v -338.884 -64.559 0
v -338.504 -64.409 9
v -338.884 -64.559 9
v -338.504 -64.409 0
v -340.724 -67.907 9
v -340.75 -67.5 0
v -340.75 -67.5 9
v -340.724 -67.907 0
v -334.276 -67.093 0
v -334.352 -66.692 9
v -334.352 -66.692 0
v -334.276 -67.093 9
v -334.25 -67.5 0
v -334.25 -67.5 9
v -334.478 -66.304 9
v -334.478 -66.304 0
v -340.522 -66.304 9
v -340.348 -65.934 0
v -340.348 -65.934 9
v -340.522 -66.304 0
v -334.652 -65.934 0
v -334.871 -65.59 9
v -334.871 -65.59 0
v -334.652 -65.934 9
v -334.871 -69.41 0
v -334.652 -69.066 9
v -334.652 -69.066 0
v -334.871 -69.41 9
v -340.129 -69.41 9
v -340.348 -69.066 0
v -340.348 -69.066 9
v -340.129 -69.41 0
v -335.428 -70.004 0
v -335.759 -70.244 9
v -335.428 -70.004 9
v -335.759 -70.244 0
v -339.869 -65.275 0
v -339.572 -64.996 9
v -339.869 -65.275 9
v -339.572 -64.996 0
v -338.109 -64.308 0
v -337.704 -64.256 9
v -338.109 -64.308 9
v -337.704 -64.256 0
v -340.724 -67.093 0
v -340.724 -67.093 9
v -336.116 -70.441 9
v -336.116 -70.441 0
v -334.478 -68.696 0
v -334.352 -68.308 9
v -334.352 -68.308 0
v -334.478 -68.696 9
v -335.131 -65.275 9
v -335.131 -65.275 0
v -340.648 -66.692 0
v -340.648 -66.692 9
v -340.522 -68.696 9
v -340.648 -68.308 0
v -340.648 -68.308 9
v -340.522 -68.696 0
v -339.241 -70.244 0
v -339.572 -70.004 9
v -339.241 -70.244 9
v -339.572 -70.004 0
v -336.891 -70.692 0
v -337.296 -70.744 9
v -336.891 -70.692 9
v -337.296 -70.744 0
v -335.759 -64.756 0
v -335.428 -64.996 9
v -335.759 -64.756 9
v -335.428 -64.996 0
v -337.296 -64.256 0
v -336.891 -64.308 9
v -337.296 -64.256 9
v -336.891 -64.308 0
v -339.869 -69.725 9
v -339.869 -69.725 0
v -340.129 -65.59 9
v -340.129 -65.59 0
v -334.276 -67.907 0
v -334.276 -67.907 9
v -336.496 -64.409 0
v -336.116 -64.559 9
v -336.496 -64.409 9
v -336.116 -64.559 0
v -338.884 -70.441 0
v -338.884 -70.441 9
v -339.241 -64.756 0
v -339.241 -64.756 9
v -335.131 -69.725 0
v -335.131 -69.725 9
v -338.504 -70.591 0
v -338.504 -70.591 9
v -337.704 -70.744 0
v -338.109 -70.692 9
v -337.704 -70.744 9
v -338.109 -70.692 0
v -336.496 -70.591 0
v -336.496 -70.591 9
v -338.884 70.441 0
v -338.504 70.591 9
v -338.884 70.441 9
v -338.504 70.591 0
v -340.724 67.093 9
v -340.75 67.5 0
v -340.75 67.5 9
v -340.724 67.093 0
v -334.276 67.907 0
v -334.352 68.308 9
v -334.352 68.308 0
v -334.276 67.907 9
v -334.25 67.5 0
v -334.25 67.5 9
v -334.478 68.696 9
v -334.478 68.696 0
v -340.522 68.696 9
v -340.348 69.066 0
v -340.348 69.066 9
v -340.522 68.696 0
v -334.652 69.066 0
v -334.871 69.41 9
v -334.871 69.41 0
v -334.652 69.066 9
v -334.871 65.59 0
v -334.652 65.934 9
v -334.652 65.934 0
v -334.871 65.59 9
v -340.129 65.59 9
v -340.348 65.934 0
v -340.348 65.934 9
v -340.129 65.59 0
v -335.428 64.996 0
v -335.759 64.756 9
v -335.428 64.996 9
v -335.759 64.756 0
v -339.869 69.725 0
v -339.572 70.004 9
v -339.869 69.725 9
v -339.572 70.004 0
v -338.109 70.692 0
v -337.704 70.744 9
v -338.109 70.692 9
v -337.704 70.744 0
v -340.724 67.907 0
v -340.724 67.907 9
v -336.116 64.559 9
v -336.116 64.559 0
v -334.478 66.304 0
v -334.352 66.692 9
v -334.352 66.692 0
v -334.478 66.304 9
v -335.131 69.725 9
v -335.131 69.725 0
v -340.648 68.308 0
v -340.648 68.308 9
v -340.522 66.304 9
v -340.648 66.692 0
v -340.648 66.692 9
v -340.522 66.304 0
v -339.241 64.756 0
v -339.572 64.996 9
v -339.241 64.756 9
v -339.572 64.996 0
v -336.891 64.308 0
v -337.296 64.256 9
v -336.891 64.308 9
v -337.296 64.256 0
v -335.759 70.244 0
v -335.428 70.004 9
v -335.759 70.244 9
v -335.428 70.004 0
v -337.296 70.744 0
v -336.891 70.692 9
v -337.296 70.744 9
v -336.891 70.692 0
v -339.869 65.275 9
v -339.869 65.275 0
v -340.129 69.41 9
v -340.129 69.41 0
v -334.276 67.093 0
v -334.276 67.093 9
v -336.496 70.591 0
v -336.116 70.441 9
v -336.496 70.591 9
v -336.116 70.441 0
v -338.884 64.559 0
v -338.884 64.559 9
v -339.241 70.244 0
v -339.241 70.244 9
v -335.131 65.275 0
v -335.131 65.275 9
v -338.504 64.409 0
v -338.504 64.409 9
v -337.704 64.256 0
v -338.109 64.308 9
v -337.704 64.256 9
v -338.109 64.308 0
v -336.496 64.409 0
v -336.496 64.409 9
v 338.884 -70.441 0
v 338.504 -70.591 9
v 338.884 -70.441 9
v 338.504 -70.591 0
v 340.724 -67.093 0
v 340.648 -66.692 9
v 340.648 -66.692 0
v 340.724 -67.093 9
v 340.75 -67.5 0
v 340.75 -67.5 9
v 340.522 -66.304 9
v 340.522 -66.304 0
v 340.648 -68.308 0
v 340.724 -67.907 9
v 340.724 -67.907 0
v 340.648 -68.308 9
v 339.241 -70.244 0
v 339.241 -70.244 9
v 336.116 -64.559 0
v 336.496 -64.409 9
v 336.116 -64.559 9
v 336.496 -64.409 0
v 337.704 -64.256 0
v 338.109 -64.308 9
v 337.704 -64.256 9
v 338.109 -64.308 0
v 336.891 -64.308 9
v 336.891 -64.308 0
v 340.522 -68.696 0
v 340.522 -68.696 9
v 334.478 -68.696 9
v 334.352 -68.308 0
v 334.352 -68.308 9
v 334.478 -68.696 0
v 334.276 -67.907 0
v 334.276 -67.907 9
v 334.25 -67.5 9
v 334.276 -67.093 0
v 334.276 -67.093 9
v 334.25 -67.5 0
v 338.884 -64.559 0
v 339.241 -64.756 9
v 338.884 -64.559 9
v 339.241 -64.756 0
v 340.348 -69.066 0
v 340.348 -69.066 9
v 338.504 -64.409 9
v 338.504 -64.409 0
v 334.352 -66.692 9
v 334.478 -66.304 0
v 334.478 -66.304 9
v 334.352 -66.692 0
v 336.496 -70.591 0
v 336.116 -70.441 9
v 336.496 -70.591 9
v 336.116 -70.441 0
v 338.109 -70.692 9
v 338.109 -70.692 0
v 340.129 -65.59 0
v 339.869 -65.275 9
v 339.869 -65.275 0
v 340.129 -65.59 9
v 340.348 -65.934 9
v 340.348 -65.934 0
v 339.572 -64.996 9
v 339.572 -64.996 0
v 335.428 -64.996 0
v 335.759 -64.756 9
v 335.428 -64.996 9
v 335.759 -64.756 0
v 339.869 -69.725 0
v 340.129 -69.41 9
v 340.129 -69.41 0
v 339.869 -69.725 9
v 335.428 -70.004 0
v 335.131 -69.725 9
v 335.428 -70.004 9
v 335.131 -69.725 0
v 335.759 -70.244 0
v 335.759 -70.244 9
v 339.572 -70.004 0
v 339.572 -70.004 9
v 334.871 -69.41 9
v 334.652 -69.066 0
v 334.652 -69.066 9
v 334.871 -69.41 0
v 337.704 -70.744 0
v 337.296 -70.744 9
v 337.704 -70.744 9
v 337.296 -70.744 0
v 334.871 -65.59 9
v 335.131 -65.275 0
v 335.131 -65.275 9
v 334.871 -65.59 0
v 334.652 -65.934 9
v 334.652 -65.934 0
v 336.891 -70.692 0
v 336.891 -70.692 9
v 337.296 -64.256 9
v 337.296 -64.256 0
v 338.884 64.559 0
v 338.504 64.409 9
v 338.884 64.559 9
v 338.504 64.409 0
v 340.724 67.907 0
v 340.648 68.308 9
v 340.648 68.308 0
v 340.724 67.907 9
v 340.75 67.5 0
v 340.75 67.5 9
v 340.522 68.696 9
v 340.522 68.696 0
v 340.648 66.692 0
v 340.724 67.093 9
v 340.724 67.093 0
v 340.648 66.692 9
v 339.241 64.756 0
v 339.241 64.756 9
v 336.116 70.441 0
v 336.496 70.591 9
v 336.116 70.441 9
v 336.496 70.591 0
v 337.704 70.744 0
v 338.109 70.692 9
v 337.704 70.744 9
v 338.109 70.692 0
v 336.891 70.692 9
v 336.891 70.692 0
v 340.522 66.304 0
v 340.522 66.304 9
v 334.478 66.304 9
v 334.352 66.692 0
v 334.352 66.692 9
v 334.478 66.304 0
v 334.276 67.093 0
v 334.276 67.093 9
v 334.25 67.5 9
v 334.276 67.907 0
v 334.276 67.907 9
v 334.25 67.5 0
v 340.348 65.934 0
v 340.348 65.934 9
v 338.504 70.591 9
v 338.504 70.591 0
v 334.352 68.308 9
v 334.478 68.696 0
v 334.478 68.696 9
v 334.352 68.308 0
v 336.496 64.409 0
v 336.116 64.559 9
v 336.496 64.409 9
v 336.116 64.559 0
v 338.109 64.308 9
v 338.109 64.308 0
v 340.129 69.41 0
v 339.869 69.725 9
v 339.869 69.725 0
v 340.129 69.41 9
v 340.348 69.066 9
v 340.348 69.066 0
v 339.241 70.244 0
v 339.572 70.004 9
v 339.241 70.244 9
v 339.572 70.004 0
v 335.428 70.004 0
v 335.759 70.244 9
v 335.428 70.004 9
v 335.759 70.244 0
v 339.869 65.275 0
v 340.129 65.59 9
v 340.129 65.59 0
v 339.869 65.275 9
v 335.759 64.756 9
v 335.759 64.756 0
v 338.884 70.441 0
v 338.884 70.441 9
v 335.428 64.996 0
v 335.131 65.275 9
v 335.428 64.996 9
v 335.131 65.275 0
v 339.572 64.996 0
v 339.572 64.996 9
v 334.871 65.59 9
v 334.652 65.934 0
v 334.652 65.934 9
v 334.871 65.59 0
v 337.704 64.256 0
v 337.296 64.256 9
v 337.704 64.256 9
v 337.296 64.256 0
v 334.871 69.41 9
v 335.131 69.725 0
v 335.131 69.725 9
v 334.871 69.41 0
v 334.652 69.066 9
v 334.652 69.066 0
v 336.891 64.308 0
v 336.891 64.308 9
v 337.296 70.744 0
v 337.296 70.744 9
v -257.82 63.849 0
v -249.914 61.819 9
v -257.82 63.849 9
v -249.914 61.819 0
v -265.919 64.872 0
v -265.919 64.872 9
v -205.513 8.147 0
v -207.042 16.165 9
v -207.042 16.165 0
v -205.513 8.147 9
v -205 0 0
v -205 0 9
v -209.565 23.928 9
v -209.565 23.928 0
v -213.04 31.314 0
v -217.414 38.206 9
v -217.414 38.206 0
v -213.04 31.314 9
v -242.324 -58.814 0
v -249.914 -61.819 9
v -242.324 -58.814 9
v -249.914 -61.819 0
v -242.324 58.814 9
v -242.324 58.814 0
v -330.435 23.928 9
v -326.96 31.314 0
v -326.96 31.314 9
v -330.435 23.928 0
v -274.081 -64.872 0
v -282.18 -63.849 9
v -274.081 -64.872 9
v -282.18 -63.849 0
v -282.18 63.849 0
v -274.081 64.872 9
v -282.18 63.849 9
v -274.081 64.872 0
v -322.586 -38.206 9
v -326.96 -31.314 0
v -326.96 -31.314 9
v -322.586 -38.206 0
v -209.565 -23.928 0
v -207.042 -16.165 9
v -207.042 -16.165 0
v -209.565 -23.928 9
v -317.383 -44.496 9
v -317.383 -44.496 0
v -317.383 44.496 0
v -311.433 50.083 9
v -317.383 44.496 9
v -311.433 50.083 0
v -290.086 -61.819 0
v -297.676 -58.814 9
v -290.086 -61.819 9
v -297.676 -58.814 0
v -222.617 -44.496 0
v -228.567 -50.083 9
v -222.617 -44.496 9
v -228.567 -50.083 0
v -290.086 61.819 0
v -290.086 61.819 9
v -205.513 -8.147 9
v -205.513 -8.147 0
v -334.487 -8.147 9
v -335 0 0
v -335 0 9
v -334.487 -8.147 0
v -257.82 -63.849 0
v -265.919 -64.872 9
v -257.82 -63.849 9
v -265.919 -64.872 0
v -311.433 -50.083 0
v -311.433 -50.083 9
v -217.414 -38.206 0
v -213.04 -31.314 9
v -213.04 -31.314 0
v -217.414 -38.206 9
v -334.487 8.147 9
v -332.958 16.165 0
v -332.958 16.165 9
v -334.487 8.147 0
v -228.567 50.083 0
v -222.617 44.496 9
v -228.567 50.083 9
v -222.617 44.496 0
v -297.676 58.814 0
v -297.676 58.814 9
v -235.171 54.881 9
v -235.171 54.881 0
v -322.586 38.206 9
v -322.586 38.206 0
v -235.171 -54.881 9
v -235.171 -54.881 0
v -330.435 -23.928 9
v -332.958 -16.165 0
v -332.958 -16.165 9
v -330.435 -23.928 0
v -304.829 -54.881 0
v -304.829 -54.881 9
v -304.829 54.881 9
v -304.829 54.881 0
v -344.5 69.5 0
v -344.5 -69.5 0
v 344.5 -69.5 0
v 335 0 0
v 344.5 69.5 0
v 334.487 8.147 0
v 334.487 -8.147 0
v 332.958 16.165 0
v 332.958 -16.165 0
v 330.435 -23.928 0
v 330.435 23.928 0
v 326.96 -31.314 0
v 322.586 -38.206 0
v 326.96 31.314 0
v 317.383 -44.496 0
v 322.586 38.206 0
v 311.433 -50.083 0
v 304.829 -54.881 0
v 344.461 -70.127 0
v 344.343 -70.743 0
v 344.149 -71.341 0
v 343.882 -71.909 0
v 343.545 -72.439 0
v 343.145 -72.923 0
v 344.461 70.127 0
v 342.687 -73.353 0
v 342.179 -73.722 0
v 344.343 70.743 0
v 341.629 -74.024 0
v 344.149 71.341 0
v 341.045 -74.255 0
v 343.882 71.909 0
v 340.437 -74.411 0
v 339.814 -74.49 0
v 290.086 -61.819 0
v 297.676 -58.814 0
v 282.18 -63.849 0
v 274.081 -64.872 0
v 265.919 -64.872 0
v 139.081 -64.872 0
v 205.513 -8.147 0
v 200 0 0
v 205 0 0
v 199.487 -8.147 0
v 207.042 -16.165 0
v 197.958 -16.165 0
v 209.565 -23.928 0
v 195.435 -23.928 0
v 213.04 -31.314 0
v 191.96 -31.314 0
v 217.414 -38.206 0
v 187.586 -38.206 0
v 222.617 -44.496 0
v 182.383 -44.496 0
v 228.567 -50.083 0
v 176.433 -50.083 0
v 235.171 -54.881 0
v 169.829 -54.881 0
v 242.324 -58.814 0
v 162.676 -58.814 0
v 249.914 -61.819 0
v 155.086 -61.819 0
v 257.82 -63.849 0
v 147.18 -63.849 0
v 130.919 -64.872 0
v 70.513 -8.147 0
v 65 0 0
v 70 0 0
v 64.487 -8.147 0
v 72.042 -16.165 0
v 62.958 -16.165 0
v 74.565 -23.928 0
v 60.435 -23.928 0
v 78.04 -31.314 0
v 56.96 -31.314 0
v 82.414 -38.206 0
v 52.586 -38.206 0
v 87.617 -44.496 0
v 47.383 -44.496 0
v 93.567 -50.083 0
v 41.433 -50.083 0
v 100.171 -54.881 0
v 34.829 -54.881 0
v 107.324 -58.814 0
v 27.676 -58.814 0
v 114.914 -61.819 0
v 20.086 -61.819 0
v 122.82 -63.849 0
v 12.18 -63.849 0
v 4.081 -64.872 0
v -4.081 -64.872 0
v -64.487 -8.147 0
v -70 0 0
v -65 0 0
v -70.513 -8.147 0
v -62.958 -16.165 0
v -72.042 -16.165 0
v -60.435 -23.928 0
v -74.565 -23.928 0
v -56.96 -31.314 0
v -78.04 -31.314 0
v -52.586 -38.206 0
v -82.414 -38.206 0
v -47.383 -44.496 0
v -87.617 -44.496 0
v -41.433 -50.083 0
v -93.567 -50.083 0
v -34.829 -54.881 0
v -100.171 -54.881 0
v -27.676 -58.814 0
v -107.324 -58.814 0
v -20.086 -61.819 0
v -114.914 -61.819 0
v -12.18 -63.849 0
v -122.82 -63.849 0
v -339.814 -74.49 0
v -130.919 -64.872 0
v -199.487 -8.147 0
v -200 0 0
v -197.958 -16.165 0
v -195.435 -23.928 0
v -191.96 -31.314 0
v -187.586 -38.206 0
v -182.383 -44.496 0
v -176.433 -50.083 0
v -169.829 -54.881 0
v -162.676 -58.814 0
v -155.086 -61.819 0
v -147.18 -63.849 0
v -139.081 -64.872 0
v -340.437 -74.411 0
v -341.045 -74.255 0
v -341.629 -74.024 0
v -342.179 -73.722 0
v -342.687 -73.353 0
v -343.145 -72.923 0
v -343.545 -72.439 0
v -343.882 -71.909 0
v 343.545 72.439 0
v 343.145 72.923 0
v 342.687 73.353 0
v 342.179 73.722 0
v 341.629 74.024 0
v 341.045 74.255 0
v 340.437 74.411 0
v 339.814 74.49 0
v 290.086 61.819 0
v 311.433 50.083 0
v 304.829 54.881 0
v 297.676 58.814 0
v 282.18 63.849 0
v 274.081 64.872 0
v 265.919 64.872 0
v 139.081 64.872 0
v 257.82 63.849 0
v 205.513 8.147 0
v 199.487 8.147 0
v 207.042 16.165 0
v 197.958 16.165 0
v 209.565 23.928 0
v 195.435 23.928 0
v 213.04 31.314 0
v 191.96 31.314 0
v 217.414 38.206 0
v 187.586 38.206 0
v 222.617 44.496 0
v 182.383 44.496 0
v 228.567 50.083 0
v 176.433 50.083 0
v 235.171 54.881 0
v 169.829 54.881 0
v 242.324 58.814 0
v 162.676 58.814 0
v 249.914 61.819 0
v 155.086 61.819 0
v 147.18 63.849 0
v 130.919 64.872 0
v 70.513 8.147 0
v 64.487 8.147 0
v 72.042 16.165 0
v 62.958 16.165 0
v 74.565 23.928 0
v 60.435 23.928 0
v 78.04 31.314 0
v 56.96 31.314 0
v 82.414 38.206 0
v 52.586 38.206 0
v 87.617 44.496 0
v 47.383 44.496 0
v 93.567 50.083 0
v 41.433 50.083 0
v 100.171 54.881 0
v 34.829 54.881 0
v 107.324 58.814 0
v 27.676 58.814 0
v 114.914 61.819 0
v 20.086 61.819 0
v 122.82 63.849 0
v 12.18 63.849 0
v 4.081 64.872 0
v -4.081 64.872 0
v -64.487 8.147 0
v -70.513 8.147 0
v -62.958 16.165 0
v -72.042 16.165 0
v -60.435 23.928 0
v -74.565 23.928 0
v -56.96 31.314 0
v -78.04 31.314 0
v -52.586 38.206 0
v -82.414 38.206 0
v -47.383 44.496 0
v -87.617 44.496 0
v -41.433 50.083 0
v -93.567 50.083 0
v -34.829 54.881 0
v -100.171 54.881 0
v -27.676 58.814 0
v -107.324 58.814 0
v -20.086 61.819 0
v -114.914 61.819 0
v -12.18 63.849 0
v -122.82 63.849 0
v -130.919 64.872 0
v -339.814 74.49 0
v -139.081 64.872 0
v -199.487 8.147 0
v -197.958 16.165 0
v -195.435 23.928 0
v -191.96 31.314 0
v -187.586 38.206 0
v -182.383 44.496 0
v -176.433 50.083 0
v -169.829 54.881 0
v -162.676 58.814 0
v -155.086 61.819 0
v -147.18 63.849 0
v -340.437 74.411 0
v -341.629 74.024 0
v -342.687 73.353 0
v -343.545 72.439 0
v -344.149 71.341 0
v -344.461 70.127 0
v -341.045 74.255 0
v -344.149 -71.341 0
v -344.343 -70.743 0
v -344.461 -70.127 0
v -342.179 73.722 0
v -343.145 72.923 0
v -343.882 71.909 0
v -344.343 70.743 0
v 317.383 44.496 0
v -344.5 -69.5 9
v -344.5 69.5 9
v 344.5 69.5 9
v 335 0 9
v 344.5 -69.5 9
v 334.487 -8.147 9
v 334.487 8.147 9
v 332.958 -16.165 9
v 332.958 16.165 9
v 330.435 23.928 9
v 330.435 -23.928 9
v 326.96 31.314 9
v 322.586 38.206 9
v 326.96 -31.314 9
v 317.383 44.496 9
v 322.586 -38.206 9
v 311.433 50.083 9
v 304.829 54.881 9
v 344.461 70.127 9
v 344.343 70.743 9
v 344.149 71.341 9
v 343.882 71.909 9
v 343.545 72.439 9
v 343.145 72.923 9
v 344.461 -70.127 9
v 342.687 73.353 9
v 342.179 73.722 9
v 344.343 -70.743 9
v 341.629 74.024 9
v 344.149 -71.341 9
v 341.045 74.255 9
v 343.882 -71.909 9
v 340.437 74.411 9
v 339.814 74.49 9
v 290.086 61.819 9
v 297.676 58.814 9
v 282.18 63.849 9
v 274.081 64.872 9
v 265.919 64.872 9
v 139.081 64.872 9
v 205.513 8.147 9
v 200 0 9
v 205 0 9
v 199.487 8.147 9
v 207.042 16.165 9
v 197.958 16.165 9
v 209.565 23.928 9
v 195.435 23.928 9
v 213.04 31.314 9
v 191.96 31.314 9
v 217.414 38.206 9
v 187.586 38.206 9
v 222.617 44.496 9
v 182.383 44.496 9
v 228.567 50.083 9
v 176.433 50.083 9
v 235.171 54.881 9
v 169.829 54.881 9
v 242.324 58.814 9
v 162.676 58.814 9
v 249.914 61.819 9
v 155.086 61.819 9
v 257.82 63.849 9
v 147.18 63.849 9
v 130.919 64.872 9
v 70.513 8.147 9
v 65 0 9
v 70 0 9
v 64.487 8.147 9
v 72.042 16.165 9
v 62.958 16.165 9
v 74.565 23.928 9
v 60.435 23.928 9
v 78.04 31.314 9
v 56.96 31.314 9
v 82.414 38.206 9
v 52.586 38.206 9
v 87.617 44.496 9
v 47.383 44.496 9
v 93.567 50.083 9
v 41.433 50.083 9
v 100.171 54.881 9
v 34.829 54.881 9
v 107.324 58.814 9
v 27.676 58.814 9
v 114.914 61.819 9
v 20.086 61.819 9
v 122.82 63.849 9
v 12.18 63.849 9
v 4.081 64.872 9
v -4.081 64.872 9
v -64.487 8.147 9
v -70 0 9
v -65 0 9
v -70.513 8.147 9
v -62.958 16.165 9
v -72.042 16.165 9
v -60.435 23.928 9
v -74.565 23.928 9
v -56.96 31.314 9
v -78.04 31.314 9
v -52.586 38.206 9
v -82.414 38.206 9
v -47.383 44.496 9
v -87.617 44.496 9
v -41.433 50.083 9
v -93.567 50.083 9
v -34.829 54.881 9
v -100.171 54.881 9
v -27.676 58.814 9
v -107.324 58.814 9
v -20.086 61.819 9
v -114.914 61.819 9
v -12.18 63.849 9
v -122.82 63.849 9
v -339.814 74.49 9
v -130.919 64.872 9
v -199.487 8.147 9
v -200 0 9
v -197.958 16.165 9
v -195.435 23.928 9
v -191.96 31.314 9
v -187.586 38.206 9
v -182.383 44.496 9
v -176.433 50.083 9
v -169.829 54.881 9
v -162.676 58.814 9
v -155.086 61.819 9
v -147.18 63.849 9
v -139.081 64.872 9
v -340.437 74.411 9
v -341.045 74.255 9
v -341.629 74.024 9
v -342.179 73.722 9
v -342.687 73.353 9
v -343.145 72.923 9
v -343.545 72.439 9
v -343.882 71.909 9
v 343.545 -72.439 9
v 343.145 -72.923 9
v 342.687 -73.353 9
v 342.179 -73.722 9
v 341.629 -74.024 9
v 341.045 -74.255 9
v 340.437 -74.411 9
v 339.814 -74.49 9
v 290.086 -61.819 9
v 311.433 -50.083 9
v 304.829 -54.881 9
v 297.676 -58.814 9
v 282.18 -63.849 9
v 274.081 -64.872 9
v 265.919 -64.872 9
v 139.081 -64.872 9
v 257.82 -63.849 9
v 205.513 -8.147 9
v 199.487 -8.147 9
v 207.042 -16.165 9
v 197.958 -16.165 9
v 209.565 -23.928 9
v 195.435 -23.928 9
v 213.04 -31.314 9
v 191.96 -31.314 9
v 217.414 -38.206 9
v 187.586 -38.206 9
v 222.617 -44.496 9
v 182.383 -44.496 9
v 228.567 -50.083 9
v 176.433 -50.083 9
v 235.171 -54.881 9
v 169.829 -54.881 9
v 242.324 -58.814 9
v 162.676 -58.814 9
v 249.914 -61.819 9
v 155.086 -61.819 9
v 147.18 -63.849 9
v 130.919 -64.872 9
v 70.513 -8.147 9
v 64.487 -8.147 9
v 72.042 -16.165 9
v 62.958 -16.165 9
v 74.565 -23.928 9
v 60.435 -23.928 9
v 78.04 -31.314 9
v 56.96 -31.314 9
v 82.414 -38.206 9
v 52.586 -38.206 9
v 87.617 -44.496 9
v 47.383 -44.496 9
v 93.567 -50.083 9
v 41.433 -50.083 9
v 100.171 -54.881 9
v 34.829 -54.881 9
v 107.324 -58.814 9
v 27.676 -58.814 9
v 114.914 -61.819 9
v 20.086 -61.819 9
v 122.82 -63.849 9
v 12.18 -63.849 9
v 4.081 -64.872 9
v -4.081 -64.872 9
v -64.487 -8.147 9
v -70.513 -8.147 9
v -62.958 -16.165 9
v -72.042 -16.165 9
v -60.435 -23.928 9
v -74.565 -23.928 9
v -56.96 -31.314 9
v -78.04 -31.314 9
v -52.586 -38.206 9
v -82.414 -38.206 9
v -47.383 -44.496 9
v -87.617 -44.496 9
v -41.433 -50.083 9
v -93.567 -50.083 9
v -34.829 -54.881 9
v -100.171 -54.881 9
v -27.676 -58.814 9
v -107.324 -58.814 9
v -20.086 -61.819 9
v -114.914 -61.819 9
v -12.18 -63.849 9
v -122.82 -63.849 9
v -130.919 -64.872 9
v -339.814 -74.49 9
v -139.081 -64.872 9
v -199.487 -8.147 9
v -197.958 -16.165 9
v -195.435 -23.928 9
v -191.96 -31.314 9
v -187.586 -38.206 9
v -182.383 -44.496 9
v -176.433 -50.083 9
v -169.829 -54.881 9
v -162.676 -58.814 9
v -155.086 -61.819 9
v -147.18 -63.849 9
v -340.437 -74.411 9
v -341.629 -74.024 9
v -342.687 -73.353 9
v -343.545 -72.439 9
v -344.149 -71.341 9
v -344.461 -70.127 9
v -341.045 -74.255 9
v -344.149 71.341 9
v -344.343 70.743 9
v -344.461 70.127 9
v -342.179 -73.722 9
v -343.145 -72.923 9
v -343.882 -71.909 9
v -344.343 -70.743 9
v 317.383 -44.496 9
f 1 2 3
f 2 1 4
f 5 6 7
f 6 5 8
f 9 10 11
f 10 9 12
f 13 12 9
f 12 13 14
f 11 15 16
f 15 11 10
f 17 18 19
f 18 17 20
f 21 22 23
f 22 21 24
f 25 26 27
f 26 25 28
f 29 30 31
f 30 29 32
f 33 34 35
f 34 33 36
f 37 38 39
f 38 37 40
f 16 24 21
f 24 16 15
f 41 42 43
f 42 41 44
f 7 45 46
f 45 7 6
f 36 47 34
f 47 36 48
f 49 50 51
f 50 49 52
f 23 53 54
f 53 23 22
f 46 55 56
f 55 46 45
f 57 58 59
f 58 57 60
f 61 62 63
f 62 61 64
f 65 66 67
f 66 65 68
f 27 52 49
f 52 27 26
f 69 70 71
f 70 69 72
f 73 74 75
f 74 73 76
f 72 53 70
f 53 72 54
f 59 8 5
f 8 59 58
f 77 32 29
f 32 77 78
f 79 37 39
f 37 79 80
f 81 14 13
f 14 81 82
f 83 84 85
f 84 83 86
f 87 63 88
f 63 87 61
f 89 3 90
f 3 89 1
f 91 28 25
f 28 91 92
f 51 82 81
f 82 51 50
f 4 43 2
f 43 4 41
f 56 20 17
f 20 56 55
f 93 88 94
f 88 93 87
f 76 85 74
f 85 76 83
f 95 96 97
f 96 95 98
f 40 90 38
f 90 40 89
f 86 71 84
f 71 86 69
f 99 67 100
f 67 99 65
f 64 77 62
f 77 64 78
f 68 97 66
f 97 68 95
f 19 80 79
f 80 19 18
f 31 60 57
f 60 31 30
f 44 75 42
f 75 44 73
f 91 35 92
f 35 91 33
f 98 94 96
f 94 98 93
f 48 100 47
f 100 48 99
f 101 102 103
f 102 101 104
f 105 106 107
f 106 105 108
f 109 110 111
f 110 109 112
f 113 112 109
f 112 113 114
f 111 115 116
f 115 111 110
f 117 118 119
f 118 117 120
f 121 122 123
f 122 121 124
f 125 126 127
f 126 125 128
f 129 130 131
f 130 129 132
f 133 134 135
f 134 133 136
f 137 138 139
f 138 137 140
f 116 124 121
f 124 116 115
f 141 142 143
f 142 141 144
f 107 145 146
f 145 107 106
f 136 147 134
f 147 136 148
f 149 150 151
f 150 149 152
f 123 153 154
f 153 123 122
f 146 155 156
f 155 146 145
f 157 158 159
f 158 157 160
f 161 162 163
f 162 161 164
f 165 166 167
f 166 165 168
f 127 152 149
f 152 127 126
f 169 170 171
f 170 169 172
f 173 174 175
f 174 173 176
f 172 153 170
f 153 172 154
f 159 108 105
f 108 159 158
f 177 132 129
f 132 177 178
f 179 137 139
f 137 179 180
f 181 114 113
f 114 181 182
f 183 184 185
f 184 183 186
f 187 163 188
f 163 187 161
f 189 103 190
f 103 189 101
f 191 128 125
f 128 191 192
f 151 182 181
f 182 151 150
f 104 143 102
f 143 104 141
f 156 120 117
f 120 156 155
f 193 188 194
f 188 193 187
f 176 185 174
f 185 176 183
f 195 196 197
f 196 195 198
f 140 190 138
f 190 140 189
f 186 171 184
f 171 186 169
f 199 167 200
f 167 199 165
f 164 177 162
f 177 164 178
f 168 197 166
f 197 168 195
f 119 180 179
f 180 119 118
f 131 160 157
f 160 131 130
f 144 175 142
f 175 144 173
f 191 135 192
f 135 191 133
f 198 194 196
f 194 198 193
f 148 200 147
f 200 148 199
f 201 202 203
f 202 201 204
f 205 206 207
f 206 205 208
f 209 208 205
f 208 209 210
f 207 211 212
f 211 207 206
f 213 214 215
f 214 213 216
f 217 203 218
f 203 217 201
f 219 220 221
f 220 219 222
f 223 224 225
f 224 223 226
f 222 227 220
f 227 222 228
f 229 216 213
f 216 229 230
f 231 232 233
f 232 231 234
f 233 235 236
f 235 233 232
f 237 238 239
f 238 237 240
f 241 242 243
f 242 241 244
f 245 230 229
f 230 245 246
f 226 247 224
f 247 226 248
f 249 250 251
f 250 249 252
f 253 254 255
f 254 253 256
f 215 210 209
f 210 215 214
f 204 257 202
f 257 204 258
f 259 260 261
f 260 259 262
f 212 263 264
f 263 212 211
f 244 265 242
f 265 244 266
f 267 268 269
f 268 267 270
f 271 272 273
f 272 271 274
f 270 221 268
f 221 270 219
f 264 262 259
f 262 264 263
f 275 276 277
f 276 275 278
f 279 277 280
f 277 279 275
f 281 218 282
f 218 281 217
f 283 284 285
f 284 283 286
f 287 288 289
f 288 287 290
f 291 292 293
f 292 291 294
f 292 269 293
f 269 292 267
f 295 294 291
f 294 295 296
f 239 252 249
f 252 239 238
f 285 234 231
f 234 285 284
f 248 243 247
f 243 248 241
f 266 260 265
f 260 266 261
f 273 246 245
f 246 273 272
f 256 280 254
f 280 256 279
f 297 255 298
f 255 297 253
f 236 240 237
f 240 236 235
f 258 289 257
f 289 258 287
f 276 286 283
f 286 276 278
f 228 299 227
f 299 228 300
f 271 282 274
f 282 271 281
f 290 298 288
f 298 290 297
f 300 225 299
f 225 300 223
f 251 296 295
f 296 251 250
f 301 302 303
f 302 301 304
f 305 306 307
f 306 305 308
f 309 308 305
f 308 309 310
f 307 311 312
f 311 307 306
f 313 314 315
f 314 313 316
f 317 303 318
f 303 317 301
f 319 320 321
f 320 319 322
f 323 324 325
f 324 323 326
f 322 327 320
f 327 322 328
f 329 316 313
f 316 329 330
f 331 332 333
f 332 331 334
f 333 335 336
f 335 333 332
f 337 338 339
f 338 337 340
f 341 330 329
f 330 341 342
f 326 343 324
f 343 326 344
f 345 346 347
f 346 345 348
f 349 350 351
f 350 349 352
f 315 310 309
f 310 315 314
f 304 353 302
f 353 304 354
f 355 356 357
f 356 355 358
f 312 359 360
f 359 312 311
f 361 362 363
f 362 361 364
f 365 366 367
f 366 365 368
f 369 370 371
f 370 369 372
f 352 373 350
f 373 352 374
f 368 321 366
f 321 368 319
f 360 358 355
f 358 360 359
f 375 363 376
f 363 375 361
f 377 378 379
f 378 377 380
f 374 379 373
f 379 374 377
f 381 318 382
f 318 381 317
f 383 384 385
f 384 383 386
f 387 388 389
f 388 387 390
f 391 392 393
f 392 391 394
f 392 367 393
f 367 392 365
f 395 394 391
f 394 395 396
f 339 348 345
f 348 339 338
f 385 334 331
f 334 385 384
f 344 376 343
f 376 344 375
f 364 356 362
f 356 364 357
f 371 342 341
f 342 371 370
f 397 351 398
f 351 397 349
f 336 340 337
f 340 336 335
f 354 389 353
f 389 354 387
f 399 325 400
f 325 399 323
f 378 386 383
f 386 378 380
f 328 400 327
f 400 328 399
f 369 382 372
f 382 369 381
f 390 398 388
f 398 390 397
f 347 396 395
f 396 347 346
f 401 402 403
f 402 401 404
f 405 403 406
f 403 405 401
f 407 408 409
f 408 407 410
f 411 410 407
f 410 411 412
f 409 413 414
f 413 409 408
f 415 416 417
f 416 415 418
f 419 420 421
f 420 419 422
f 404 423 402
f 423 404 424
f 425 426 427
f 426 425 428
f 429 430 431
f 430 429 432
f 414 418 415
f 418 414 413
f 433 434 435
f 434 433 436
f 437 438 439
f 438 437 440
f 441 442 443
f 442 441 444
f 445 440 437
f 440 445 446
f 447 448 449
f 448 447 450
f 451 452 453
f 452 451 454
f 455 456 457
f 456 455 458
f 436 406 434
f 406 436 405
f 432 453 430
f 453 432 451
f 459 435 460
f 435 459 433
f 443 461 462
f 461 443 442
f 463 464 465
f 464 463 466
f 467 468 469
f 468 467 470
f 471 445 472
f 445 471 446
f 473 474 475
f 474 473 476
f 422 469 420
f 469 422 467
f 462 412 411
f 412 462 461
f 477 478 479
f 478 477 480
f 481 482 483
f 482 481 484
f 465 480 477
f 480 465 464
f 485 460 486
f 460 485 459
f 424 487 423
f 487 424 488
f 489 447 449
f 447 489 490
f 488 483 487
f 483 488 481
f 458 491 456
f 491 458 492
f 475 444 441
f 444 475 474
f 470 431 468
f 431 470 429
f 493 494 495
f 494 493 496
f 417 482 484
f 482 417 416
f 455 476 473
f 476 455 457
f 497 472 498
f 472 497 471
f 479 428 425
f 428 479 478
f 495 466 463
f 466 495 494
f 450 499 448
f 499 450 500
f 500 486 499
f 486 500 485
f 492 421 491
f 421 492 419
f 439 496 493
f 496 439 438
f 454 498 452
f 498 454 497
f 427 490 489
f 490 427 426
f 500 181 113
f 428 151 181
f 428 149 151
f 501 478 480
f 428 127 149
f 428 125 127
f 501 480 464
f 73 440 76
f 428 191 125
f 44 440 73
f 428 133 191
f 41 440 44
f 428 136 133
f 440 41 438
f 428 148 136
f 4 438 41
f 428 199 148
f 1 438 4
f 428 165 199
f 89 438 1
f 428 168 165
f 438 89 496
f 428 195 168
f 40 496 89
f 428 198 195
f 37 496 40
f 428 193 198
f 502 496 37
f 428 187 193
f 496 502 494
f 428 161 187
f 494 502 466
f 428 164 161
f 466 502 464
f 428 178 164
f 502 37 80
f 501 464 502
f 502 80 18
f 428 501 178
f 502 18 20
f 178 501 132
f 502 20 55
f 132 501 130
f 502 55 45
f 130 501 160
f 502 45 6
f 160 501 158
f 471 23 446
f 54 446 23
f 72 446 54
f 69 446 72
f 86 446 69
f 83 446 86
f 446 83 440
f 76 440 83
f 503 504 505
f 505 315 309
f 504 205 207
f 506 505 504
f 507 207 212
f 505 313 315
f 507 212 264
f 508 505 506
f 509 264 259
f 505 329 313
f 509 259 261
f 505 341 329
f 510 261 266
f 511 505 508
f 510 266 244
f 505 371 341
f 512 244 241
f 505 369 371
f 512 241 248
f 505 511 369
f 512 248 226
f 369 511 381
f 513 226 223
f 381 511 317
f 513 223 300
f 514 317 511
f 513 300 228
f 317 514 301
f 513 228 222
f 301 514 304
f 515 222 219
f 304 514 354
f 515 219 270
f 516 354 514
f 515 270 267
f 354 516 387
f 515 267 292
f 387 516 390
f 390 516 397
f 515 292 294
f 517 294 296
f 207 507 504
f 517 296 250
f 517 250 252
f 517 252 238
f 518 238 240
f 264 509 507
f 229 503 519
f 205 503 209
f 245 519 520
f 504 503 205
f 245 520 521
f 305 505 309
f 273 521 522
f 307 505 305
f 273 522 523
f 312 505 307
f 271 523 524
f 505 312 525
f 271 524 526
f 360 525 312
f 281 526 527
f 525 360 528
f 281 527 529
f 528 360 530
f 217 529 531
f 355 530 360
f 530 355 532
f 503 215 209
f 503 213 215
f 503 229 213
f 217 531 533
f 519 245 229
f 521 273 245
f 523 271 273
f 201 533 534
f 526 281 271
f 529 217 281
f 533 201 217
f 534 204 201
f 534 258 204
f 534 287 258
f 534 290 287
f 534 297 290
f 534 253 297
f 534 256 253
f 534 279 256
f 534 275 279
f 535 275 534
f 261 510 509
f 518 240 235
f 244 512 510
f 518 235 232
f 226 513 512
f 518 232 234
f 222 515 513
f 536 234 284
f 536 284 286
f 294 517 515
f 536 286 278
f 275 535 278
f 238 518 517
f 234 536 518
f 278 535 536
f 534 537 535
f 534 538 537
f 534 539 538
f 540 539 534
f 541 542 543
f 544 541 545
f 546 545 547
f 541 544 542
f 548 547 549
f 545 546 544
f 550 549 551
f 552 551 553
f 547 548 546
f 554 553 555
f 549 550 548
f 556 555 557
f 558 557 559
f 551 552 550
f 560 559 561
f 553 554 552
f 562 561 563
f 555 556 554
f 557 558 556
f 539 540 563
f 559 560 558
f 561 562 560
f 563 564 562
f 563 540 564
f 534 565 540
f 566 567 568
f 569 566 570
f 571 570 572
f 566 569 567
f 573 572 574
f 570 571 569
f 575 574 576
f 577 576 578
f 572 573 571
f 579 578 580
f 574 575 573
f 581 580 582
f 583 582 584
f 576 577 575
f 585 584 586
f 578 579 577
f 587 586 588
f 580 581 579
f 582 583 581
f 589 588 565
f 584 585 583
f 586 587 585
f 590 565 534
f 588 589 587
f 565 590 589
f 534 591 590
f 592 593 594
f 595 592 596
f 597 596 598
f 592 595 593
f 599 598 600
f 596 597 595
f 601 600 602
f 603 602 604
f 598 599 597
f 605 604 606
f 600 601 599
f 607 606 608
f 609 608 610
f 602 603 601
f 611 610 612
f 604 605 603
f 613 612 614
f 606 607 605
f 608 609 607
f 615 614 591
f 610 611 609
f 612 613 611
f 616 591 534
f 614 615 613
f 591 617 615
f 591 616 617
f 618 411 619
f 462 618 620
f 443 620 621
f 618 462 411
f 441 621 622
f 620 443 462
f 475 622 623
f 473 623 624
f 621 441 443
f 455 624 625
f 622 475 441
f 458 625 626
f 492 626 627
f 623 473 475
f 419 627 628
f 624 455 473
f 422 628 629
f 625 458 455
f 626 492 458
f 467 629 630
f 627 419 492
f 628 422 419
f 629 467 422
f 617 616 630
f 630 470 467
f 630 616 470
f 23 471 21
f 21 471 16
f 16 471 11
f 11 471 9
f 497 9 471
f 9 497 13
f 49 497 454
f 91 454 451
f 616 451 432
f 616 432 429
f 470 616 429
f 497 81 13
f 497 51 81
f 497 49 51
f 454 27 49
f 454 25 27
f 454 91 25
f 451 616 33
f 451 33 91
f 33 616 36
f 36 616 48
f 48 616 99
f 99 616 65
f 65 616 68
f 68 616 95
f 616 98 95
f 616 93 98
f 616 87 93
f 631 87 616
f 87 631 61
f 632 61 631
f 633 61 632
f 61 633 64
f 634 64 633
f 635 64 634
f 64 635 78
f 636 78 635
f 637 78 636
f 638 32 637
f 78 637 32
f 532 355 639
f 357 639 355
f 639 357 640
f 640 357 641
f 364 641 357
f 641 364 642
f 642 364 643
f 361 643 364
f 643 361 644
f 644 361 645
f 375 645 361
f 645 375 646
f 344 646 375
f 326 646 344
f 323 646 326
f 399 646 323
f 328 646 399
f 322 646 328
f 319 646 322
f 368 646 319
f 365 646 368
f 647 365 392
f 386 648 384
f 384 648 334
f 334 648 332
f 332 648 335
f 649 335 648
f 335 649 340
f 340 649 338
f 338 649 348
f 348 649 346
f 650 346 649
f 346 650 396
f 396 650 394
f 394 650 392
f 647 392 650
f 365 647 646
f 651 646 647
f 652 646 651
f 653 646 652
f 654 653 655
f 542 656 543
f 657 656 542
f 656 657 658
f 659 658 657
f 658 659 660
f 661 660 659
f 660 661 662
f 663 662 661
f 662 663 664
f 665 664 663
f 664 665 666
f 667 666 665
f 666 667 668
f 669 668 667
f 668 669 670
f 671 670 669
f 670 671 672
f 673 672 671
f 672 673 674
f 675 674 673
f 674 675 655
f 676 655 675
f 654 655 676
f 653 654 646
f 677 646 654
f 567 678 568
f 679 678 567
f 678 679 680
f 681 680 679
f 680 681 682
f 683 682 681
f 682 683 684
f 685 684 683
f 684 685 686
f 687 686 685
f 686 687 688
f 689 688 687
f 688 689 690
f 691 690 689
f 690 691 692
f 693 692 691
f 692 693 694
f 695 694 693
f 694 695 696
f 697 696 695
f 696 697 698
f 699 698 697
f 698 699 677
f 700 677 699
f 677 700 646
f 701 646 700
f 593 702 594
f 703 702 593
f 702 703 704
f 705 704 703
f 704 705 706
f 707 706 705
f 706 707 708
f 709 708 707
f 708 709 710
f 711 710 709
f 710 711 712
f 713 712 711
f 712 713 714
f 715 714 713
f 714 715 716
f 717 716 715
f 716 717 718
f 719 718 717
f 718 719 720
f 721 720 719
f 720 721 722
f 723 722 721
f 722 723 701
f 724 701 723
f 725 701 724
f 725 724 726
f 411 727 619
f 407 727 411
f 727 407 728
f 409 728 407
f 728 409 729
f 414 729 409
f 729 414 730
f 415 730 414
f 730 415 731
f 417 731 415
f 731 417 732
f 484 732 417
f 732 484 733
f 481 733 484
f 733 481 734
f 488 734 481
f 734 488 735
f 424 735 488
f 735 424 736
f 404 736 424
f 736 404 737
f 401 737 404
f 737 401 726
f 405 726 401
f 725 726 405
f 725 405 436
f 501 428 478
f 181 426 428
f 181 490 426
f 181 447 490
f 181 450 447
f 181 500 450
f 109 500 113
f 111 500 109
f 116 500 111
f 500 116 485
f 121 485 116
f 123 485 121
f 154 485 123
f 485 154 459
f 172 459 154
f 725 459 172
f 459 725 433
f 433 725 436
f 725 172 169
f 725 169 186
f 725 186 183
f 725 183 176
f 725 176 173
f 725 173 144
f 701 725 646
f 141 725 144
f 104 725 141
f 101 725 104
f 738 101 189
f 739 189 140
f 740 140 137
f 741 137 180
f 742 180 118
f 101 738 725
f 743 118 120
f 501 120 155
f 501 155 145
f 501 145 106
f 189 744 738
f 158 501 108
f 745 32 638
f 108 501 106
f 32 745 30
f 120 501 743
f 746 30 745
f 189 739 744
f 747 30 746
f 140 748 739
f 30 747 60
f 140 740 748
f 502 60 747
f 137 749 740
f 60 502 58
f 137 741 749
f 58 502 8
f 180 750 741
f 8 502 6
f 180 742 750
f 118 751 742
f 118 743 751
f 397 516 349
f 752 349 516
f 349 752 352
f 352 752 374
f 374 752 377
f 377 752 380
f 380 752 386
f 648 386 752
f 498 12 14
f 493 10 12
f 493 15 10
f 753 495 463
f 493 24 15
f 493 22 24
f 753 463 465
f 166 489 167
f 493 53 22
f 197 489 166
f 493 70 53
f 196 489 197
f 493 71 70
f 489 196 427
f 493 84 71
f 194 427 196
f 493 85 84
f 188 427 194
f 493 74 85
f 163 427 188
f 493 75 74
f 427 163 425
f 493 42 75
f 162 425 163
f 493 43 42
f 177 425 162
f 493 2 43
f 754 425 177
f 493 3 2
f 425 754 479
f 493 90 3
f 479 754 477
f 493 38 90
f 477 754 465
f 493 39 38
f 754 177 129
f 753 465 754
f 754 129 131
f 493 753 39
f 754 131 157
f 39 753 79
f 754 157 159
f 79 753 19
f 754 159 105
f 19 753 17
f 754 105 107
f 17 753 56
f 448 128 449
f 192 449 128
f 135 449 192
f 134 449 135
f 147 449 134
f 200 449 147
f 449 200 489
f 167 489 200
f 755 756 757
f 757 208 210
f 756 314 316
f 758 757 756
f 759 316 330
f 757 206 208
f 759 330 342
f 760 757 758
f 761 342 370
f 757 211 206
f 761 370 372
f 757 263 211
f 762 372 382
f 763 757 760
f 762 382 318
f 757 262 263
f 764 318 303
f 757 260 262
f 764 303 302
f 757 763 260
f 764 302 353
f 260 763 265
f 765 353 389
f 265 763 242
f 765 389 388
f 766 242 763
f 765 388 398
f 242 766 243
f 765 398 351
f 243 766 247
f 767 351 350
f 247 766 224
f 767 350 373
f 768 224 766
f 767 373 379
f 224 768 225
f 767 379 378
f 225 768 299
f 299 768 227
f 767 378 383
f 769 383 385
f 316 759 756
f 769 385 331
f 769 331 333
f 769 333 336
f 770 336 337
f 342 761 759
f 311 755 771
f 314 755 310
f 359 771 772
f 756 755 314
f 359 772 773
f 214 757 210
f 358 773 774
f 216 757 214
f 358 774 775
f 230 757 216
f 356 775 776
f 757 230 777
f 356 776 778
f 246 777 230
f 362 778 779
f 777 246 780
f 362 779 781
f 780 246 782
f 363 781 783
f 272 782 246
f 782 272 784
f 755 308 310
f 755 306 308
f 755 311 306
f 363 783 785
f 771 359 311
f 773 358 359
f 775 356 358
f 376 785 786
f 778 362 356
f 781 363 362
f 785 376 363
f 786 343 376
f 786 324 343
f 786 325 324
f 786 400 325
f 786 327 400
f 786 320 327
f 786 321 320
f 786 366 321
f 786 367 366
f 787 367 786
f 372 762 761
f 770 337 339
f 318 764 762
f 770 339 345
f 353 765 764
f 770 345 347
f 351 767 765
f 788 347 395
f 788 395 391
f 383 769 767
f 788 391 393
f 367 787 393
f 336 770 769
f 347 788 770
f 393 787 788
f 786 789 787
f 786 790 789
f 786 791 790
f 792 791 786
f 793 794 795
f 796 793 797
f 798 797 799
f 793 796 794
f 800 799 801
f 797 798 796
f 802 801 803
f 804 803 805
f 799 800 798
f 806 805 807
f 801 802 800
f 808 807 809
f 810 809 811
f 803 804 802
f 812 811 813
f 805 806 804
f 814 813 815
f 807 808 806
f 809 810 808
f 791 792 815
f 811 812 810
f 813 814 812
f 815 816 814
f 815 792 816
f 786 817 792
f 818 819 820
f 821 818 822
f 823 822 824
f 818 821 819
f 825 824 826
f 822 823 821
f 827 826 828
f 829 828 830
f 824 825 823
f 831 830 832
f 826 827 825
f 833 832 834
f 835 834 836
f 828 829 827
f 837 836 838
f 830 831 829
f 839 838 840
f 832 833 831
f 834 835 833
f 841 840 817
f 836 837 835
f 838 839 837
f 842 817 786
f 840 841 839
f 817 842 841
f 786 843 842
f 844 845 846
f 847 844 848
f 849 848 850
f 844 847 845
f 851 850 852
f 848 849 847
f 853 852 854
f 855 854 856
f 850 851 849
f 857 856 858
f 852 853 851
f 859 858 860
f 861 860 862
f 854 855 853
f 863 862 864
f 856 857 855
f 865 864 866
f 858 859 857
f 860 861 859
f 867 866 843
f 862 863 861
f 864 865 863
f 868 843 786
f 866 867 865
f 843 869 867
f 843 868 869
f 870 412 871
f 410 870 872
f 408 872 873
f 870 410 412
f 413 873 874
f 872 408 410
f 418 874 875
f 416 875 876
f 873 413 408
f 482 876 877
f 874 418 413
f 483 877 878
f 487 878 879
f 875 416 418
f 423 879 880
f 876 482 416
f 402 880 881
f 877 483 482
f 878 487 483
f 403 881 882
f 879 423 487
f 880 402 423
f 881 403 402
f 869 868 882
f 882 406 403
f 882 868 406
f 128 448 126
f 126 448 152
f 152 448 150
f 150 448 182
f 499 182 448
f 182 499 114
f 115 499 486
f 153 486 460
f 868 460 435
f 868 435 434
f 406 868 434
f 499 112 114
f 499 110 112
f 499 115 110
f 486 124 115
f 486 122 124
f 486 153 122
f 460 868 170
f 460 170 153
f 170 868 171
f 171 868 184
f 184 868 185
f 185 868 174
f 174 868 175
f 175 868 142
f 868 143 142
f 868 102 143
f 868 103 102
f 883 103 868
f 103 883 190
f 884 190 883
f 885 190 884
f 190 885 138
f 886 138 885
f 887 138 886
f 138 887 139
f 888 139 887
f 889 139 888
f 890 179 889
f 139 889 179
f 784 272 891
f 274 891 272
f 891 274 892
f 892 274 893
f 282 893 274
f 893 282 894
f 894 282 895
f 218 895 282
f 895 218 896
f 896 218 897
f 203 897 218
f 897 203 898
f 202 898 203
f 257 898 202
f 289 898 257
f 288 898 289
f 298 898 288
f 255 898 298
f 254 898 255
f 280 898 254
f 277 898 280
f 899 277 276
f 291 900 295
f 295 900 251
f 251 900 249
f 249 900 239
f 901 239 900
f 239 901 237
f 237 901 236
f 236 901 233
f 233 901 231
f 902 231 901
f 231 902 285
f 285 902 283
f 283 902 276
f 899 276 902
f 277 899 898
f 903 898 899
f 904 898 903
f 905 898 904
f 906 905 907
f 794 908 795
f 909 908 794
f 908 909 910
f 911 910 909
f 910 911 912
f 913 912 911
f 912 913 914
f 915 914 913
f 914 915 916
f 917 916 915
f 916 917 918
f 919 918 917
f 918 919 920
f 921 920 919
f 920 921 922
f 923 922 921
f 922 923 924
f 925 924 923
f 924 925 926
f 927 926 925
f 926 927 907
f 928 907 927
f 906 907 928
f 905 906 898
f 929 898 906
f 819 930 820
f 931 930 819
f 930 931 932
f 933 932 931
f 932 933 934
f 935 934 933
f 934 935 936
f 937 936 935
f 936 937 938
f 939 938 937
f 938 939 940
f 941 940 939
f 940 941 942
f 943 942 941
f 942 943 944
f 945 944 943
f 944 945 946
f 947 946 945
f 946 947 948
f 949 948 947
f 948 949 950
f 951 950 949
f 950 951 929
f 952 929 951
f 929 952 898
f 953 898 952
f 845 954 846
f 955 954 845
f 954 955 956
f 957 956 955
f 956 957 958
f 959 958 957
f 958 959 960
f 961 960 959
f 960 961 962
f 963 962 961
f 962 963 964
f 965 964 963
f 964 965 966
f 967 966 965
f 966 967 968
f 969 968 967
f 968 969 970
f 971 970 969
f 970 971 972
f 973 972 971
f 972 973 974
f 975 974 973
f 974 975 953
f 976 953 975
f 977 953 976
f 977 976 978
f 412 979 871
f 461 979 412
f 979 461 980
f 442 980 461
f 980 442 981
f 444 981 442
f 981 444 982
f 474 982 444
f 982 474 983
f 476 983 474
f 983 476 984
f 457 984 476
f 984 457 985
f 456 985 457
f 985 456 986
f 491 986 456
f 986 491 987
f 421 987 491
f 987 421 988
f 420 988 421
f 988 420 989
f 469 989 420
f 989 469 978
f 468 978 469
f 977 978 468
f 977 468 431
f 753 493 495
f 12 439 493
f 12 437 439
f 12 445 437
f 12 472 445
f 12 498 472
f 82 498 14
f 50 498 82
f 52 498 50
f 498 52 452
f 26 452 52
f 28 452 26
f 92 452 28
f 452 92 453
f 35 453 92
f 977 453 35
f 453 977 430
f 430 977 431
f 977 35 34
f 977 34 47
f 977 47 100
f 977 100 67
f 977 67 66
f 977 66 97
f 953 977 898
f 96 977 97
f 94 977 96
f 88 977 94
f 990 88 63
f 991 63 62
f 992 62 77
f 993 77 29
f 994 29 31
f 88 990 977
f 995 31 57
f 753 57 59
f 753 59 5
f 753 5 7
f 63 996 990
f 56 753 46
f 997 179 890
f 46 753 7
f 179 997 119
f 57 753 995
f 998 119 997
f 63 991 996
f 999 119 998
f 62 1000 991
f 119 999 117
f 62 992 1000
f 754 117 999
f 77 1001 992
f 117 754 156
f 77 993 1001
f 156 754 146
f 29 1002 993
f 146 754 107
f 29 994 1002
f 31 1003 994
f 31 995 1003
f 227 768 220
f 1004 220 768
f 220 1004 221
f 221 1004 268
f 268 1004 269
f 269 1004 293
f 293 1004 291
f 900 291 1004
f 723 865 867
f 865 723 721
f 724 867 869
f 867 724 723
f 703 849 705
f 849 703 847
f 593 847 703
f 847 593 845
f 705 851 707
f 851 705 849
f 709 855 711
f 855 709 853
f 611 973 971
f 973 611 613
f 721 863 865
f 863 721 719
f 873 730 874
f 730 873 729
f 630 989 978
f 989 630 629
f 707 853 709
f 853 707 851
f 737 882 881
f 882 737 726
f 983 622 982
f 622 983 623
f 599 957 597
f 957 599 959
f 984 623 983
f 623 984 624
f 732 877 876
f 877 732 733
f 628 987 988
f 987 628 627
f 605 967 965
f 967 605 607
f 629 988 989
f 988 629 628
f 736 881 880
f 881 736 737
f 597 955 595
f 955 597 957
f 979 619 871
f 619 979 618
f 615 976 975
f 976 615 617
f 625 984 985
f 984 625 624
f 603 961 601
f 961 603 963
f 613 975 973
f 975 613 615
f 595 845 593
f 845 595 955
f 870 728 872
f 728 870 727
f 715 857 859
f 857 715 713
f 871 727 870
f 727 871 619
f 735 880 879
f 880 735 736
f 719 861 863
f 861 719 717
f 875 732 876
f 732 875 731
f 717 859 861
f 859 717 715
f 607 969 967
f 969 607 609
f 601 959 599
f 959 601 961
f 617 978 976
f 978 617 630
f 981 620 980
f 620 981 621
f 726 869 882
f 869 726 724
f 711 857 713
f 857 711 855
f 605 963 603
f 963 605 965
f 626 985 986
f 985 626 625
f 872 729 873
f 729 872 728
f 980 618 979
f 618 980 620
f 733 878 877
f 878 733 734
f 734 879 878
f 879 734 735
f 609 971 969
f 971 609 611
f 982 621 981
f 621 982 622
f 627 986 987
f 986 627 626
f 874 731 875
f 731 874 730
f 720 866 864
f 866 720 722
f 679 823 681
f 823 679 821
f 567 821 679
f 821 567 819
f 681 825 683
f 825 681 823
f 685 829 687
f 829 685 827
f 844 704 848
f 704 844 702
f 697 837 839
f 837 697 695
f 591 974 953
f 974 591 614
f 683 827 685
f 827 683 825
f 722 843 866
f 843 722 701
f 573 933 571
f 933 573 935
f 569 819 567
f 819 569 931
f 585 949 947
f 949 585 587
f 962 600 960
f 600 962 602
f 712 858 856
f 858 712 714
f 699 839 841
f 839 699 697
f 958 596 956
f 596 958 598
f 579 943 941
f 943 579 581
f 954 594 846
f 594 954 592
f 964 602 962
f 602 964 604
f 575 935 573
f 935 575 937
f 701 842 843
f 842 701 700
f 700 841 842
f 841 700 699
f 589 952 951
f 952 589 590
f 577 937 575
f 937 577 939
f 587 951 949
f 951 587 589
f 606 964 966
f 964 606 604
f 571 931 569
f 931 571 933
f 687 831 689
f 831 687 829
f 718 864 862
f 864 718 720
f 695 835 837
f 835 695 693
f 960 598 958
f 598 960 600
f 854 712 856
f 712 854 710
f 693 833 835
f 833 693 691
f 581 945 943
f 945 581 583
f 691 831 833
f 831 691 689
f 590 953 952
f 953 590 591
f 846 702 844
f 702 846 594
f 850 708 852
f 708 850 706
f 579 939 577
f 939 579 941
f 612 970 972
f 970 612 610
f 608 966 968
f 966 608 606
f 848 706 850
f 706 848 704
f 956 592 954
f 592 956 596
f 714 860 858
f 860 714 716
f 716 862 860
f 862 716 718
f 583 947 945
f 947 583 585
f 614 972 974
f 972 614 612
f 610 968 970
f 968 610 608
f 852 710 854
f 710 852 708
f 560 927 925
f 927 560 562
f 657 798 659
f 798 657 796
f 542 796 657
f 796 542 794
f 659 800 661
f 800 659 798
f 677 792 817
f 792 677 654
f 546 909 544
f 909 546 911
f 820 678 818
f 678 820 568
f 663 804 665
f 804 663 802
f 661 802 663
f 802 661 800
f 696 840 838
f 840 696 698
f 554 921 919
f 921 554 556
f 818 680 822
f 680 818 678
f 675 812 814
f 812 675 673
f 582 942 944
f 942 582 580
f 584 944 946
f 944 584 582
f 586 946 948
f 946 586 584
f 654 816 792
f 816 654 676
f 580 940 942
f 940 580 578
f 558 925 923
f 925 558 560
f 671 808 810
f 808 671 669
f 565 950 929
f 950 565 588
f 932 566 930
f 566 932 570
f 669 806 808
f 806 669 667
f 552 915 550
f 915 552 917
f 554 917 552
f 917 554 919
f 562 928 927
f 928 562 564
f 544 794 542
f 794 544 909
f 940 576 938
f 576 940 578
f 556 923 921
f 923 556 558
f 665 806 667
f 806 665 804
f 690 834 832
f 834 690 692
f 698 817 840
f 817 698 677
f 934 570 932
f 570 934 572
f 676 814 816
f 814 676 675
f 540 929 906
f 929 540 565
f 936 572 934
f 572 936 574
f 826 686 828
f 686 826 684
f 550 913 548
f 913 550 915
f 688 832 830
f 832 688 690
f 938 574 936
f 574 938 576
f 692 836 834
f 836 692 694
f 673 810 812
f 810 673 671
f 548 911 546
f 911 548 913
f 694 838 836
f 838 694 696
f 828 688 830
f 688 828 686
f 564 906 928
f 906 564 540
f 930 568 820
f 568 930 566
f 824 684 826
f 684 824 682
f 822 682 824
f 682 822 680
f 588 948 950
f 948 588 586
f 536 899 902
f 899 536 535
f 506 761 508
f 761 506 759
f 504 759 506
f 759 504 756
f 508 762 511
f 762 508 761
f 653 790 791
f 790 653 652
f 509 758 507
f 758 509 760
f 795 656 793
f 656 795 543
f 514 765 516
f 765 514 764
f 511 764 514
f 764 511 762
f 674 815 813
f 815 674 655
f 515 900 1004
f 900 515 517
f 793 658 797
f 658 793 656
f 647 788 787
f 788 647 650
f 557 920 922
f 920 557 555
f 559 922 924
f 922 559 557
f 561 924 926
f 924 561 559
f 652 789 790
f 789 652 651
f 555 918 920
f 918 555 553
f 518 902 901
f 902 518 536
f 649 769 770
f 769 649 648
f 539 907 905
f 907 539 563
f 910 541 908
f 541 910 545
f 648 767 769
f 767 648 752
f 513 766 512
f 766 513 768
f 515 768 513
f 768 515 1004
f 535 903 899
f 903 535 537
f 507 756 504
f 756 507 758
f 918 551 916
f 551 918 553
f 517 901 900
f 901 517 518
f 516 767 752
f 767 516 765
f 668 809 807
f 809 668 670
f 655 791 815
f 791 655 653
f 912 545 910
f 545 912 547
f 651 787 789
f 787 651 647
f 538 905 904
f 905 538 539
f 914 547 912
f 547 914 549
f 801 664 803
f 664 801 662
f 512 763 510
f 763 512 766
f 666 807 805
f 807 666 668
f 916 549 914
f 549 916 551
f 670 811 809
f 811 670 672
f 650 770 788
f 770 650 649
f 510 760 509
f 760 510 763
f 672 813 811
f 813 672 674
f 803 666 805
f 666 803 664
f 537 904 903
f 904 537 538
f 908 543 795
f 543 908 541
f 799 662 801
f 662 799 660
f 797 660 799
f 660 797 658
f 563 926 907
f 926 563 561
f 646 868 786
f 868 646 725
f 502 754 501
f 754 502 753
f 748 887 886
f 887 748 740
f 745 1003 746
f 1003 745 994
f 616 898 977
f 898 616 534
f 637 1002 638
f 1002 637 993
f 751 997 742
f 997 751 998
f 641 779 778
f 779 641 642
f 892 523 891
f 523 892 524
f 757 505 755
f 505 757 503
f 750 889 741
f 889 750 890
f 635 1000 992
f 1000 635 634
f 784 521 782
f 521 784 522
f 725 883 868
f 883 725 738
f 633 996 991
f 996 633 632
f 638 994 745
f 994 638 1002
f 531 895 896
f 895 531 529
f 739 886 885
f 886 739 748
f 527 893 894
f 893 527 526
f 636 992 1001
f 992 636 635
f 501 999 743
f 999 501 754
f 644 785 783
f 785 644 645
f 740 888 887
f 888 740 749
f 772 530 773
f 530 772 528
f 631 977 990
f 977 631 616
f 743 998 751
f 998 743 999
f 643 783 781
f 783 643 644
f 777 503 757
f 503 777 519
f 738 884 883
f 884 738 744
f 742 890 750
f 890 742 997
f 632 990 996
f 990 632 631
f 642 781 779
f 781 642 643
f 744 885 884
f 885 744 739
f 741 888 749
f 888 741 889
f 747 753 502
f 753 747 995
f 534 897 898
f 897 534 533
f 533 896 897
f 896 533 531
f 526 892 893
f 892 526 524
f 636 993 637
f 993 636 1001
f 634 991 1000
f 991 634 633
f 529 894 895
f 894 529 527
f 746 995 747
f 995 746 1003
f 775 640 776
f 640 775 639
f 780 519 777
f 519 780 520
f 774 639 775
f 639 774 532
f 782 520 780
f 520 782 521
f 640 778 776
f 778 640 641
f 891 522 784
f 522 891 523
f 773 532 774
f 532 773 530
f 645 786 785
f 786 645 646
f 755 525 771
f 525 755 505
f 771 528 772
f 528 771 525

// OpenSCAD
$fn = 50;


difference() {
	union() {
		hull() {
			translate(v = [-339.5000000000, 69.5000000000, 0]) {
				cylinder(h = 9, r = 5);
			}
			translate(v = [339.5000000000, 69.5000000000, 0]) {
				cylinder(h = 9, r = 5);
			}
			translate(v = [-339.5000000000, -69.5000000000, 0]) {
				cylinder(h = 9, r = 5);
			}
			translate(v = [339.5000000000, -69.5000000000, 0]) {
				cylinder(h = 9, r = 5);
			}
		}
	}
	union() {
		#translate(v = [-337.5000000000, -67.5000000000, -100.0000000000]) {
			cylinder(h = 200, r = 3.2500000000);
		}
		#translate(v = [-337.5000000000, 67.5000000000, -100.0000000000]) {
			cylinder(h = 200, r = 3.2500000000);
		}
		#translate(v = [337.5000000000, -67.5000000000, -100.0000000000]) {
			cylinder(h = 200, r = 3.2500000000);
		}
		#translate(v = [337.5000000000, 67.5000000000, -100.0000000000]) {
			cylinder(h = 200, r = 3.2500000000);
		}
		#translate(v = [-270.0000000000, 0, 0]) {
			cylinder(h = 9, r = 65.0000000000);
		}
		#translate(v = [-135.0000000000, 0, 0]) {
			cylinder(h = 9, r = 65.0000000000);
		}
		#cylinder(h = 9, r = 65.0000000000);
		#translate(v = [135.0000000000, 0, 0]) {
			cylinder(h = 9, r = 65.0000000000);
		}
		#translate(v = [270.0000000000, 0, 0]) {
			cylinder(h = 9, r = 65.0000000000);
		}
	}
}
